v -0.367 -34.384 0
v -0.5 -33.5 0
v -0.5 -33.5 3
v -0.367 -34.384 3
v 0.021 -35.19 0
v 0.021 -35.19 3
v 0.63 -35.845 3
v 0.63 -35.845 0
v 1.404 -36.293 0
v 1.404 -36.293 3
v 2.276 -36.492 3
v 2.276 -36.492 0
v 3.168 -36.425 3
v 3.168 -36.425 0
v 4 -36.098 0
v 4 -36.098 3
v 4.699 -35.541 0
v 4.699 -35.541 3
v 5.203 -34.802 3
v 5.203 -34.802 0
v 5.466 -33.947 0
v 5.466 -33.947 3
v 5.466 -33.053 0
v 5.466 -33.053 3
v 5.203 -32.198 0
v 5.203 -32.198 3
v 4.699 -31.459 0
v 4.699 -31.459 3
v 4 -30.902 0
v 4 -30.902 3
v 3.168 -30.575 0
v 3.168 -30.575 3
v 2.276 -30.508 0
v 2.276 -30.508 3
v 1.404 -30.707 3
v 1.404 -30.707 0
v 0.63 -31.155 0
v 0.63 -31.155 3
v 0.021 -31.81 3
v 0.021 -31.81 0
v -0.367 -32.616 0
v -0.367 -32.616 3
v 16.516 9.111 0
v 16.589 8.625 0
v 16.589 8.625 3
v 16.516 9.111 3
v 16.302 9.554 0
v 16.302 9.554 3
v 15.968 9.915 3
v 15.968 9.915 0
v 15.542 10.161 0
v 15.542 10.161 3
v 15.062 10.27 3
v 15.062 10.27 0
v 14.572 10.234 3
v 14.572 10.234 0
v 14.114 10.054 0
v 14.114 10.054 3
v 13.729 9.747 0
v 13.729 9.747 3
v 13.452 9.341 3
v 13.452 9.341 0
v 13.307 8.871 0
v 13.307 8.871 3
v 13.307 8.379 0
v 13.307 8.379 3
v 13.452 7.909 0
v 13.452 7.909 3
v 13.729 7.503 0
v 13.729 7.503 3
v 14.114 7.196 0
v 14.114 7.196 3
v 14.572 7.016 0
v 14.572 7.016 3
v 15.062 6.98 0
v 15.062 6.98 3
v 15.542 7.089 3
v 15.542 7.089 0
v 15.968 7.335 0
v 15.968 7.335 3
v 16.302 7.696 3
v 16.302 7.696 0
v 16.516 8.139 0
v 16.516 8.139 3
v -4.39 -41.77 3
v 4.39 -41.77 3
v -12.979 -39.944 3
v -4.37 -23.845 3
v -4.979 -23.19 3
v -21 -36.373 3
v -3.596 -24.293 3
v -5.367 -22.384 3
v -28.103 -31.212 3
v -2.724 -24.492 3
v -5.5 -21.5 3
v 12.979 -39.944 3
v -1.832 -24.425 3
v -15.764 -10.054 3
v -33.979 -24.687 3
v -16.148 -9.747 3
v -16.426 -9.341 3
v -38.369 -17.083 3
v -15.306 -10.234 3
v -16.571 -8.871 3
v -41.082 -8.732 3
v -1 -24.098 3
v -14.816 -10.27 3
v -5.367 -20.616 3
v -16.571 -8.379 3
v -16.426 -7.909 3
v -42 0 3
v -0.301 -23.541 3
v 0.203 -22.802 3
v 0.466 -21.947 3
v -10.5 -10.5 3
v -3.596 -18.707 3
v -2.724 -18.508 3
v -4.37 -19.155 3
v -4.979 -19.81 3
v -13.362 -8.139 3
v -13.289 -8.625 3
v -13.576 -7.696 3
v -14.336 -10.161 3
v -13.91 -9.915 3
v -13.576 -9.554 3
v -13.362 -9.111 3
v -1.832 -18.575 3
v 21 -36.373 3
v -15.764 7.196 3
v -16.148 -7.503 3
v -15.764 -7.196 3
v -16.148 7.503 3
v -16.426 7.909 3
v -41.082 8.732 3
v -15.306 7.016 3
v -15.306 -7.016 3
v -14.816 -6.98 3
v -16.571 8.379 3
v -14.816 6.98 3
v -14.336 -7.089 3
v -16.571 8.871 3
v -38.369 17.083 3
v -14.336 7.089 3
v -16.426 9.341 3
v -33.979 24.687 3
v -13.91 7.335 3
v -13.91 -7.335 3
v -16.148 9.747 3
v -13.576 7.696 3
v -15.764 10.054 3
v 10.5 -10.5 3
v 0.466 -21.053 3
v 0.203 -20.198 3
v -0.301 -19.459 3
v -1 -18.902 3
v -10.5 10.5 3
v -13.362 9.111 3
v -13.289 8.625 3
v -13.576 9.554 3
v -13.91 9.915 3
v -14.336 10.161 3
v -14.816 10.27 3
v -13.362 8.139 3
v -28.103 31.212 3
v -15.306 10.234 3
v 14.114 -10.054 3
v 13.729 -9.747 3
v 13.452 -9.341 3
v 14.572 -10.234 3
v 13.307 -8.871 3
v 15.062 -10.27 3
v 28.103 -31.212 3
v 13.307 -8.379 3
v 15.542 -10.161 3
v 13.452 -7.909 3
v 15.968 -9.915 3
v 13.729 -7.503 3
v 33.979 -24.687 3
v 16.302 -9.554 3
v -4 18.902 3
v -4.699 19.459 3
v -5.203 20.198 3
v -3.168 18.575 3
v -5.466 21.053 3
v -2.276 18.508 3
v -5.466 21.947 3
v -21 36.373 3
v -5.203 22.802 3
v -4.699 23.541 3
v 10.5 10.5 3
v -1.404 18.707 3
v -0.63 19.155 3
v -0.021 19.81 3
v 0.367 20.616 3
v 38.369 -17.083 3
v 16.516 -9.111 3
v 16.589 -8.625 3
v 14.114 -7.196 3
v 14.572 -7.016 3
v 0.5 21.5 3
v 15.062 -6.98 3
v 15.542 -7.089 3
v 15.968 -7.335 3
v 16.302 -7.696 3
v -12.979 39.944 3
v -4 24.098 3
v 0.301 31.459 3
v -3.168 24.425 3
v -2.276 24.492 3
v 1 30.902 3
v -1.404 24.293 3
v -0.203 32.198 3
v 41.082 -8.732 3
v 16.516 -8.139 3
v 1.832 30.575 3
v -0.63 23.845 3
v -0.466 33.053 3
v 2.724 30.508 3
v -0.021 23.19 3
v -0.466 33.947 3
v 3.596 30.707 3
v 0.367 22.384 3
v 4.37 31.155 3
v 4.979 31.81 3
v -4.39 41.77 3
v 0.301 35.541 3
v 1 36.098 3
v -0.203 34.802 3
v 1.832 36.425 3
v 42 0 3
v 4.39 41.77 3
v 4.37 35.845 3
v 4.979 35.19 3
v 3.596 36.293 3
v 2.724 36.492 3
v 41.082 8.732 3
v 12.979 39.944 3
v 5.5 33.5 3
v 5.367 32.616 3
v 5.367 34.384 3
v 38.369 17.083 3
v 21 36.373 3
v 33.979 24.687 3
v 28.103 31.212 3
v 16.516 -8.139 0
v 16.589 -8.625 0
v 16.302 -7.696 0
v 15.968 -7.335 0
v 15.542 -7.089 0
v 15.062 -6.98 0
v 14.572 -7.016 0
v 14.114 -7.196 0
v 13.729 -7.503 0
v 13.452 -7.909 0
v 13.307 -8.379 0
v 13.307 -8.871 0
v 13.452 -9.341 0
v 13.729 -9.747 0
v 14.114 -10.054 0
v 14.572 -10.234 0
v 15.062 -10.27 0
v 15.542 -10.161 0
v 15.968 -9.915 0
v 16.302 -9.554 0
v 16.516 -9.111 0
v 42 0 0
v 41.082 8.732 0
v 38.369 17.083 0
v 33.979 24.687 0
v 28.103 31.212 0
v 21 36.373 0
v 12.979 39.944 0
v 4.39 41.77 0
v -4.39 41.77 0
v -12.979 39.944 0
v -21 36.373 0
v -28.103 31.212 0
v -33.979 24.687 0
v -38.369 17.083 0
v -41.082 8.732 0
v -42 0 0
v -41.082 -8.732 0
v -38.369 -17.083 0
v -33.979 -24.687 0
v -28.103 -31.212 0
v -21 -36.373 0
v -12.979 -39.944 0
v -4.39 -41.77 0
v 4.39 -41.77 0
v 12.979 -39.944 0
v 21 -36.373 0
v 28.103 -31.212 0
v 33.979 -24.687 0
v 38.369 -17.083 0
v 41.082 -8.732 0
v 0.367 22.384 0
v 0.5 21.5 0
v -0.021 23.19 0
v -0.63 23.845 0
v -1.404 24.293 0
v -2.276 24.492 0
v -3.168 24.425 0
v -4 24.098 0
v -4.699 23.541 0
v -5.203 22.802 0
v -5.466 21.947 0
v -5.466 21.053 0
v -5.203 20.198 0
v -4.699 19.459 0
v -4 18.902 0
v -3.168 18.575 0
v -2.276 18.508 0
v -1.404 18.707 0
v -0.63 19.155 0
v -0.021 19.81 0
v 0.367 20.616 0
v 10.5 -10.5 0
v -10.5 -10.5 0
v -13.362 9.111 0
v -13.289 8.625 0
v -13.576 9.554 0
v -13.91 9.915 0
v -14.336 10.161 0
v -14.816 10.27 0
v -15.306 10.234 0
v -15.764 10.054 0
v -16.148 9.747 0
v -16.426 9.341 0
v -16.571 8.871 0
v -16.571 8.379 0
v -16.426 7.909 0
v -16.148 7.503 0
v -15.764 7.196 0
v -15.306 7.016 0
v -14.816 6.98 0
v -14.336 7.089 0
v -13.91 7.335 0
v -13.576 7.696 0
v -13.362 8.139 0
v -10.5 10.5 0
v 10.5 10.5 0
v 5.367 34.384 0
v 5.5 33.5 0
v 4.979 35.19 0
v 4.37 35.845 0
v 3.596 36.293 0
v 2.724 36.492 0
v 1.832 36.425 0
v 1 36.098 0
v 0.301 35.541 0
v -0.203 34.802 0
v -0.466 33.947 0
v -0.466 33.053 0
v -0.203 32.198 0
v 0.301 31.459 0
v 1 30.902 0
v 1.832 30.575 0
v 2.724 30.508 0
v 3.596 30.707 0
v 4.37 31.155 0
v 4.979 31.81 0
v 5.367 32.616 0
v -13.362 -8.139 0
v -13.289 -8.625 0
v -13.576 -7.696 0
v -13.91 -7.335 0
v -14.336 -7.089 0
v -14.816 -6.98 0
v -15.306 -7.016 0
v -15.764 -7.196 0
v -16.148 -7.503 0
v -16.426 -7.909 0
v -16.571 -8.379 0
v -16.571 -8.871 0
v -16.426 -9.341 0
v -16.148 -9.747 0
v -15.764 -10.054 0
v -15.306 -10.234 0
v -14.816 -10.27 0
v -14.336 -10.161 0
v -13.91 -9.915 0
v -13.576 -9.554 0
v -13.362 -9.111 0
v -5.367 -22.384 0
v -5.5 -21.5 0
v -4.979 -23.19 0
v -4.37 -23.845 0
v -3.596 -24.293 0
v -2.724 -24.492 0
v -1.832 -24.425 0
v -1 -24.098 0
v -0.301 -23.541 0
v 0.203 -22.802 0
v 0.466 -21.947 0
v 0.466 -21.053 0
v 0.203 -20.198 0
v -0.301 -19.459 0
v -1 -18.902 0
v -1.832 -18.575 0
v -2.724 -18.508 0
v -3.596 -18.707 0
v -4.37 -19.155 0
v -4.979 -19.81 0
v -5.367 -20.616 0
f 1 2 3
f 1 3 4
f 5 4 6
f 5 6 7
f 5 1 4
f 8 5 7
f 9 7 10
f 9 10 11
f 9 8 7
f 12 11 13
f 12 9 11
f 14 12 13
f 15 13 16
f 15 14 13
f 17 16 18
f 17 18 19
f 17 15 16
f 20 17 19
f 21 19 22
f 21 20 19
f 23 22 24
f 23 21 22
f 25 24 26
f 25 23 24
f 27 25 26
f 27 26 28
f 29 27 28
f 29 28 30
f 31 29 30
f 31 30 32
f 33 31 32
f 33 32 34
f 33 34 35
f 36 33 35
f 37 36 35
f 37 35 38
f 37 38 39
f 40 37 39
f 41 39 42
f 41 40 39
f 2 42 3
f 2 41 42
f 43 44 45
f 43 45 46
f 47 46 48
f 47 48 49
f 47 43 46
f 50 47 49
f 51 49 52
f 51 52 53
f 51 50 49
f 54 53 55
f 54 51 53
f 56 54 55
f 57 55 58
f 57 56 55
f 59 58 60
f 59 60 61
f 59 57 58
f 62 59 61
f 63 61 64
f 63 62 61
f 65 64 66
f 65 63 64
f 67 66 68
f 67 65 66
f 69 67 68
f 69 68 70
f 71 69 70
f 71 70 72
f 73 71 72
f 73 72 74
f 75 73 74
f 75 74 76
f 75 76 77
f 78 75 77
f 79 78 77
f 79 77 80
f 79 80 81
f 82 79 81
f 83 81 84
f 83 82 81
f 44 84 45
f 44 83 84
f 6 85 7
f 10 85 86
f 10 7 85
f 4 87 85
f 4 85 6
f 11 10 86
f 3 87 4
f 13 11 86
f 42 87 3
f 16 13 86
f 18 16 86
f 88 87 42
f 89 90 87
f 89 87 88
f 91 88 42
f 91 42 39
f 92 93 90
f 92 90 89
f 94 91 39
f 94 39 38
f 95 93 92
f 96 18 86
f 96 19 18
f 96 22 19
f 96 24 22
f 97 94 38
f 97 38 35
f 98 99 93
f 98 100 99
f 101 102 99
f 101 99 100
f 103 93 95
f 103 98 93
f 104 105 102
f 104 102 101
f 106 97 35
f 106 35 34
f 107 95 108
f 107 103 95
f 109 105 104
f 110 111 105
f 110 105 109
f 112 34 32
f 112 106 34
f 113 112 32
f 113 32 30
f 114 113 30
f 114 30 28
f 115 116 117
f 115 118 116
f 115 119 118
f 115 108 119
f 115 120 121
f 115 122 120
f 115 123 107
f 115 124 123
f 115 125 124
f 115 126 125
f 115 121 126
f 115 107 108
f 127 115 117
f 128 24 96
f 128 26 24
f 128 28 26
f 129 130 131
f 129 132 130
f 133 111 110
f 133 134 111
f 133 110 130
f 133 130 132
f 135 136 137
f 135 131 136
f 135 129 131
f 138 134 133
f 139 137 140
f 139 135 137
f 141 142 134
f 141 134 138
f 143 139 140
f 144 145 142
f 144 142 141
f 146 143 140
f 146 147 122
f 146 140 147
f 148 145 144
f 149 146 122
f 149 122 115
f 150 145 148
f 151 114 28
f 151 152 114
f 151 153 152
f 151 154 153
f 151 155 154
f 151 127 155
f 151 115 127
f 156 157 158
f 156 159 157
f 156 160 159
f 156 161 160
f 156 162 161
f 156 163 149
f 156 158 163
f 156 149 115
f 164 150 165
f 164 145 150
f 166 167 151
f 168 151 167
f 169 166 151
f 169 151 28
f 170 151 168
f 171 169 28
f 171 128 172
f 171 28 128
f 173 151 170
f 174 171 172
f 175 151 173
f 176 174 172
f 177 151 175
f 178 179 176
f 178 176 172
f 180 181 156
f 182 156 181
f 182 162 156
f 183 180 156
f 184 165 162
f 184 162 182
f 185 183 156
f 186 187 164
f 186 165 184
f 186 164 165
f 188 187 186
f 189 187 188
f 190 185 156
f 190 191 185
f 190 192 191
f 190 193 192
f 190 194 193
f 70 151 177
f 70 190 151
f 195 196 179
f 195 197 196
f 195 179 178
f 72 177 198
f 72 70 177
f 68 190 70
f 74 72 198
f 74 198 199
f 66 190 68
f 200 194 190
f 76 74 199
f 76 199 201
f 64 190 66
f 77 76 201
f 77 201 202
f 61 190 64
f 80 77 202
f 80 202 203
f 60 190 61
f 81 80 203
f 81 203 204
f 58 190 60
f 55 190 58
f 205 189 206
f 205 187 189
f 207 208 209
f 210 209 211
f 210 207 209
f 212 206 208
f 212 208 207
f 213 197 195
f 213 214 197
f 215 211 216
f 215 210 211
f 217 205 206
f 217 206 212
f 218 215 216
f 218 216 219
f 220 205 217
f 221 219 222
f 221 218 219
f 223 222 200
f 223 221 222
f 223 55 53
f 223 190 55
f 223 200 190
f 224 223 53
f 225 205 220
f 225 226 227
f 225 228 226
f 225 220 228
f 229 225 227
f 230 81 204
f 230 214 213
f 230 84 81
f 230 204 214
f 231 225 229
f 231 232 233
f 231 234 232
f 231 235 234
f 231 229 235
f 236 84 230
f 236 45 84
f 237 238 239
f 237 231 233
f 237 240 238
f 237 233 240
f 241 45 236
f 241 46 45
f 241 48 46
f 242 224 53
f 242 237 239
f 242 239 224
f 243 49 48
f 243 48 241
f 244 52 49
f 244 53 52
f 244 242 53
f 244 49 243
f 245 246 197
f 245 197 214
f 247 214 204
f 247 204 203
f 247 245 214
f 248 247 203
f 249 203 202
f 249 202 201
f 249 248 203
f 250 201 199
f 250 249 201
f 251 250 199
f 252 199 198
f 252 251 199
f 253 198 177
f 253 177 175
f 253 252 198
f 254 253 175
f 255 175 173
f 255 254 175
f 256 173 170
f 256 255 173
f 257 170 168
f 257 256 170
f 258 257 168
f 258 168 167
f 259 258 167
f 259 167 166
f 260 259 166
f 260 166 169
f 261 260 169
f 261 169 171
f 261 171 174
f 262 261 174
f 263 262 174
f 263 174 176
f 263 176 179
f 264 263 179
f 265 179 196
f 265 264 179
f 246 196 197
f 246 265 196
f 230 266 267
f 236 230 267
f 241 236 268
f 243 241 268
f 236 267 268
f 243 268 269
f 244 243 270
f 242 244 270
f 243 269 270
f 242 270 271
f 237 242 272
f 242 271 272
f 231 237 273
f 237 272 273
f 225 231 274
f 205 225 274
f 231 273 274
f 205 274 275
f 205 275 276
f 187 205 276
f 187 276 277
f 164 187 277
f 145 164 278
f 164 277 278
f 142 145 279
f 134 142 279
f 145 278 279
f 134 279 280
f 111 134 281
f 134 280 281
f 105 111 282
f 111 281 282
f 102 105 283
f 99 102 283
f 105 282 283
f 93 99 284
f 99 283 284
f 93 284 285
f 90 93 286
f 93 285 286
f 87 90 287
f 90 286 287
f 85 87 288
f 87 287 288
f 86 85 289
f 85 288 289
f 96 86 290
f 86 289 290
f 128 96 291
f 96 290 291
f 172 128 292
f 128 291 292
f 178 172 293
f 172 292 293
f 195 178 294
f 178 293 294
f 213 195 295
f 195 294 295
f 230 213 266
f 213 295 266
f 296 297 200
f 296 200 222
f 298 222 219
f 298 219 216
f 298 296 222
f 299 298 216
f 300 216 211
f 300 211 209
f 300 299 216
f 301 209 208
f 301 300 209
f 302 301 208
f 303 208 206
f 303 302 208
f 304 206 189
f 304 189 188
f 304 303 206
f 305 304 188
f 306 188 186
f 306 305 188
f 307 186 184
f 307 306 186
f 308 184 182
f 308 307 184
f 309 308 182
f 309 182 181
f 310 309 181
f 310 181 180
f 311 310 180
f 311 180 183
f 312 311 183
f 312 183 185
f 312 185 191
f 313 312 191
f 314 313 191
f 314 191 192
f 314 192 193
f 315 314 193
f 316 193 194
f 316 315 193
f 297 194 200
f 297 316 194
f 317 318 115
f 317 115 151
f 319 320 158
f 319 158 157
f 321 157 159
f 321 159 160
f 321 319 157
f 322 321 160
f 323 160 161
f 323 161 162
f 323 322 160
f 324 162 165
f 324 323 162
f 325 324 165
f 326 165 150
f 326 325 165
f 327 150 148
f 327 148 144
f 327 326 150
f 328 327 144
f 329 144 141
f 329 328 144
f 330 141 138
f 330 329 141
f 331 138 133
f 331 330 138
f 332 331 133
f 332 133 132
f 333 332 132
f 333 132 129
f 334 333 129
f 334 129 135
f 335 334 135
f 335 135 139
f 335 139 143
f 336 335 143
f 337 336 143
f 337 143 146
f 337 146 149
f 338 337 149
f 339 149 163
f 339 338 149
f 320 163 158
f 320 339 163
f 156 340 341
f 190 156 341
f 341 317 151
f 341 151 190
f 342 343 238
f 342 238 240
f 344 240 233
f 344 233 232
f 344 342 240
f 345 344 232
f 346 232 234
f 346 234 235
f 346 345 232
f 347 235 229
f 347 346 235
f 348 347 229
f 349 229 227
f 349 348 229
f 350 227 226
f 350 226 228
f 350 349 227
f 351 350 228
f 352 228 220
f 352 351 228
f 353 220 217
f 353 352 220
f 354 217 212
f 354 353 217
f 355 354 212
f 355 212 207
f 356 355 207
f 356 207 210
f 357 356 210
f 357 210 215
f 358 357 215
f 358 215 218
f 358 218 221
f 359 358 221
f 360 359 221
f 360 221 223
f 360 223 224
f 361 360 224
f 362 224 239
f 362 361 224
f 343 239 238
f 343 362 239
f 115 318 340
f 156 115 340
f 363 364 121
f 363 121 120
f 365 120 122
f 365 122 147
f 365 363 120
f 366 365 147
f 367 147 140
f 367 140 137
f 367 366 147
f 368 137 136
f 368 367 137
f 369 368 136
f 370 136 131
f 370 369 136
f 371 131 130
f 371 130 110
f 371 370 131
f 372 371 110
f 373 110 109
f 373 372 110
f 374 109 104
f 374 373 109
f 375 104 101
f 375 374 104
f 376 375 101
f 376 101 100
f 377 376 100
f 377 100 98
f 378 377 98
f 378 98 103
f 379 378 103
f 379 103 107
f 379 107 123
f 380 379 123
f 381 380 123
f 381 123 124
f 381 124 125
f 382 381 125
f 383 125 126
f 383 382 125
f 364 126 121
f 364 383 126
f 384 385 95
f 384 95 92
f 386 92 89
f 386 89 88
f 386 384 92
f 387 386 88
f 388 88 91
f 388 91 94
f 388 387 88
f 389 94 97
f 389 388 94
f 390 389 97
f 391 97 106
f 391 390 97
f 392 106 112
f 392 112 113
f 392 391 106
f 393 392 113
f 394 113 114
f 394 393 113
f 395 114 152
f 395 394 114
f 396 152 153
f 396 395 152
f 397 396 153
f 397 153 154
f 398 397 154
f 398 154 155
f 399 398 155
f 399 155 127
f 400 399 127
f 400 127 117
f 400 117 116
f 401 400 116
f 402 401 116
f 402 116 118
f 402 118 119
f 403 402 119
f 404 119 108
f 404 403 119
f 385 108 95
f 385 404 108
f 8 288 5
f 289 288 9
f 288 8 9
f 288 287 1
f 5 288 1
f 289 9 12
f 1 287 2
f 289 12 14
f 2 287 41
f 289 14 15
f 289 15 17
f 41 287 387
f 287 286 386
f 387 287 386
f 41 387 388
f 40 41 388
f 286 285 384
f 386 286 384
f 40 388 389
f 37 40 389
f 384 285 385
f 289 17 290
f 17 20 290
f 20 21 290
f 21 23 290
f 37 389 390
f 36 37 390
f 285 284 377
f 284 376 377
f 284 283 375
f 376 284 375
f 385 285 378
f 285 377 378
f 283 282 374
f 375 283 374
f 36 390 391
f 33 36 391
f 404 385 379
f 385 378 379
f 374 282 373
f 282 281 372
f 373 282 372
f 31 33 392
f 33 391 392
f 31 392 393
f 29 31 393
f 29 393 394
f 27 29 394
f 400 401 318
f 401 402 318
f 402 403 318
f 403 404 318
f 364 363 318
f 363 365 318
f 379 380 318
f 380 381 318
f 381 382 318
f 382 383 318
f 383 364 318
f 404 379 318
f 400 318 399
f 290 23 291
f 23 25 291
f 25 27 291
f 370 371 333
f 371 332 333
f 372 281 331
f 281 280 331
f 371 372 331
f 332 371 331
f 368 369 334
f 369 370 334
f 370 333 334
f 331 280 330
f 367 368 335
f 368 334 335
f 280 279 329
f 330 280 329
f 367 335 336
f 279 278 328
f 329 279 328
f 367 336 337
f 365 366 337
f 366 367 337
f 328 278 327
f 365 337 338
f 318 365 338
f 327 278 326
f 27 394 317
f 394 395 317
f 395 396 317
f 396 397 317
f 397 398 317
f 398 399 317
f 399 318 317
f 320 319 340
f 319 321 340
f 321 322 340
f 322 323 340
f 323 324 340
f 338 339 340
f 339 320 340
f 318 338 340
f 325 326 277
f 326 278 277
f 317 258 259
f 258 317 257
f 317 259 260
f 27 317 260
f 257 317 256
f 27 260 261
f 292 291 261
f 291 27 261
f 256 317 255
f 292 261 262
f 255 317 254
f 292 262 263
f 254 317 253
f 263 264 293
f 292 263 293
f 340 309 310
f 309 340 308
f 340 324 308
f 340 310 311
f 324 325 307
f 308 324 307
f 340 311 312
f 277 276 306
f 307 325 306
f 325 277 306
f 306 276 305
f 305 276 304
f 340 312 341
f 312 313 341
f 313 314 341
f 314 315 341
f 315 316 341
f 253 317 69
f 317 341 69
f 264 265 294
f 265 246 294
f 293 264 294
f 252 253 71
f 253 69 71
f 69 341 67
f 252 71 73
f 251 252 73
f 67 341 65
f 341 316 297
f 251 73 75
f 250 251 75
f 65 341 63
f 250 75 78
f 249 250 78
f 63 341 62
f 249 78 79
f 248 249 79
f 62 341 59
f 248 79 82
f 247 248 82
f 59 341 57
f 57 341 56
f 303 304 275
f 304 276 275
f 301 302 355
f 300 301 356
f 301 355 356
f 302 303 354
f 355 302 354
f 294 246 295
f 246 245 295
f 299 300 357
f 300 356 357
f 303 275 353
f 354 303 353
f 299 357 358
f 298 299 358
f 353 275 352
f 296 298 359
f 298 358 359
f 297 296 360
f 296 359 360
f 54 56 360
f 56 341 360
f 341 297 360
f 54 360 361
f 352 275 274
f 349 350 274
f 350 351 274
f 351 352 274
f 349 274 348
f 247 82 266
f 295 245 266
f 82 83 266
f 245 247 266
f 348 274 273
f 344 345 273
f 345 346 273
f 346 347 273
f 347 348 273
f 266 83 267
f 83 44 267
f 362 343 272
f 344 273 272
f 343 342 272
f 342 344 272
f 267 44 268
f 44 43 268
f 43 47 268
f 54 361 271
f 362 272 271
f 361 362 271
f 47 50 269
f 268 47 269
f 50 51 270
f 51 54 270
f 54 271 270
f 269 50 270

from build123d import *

# Parameters (mm, degrees)
SKETCH_1_R      = 42
SKETCH_1_R_2    = 1.65
SKETCH_1_R_3    = 3
SKETCH_1_W      = 21
SKETCH_1_H      = 21
EXTRUDE_1_DEPTH = 3


with BuildPart() as part:
    # 草图1 → 凸台-拉伸1 (new body)
    with BuildSketch(Plane.XY):
        Circle(SKETCH_1_R)
        with Locations((14.938938215, 8.625)):
            Circle(SKETCH_1_R_2, mode=Mode.SUBTRACT)
        with Locations((14.938938215, -8.625)):
            Circle(SKETCH_1_R_2, mode=Mode.SUBTRACT)
        with Locations((-14.938938215, -8.625)):
            Circle(SKETCH_1_R_2, mode=Mode.SUBTRACT)
        with Locations((-14.938938215, 8.625)):
            Circle(SKETCH_1_R_2, mode=Mode.SUBTRACT)
        with Locations((2.5, 33.5)):
            Circle(SKETCH_1_R_3, mode=Mode.SUBTRACT)
        with Locations((-2.5, 21.5)):
            Circle(SKETCH_1_R_3, mode=Mode.SUBTRACT)
        with Locations(Location((-2.5, -21.5, 0), (0, 0, 180))):
            Circle(SKETCH_1_R_3, mode=Mode.SUBTRACT)
        with Locations(Location((2.5, -33.5, 0), (0, 0, 180))):
            Circle(SKETCH_1_R_3, mode=Mode.SUBTRACT)
        Rectangle(SKETCH_1_W, SKETCH_1_H, mode=Mode.SUBTRACT)
    extrude(amount=EXTRUDE_1_DEPTH)


solid = part.part
